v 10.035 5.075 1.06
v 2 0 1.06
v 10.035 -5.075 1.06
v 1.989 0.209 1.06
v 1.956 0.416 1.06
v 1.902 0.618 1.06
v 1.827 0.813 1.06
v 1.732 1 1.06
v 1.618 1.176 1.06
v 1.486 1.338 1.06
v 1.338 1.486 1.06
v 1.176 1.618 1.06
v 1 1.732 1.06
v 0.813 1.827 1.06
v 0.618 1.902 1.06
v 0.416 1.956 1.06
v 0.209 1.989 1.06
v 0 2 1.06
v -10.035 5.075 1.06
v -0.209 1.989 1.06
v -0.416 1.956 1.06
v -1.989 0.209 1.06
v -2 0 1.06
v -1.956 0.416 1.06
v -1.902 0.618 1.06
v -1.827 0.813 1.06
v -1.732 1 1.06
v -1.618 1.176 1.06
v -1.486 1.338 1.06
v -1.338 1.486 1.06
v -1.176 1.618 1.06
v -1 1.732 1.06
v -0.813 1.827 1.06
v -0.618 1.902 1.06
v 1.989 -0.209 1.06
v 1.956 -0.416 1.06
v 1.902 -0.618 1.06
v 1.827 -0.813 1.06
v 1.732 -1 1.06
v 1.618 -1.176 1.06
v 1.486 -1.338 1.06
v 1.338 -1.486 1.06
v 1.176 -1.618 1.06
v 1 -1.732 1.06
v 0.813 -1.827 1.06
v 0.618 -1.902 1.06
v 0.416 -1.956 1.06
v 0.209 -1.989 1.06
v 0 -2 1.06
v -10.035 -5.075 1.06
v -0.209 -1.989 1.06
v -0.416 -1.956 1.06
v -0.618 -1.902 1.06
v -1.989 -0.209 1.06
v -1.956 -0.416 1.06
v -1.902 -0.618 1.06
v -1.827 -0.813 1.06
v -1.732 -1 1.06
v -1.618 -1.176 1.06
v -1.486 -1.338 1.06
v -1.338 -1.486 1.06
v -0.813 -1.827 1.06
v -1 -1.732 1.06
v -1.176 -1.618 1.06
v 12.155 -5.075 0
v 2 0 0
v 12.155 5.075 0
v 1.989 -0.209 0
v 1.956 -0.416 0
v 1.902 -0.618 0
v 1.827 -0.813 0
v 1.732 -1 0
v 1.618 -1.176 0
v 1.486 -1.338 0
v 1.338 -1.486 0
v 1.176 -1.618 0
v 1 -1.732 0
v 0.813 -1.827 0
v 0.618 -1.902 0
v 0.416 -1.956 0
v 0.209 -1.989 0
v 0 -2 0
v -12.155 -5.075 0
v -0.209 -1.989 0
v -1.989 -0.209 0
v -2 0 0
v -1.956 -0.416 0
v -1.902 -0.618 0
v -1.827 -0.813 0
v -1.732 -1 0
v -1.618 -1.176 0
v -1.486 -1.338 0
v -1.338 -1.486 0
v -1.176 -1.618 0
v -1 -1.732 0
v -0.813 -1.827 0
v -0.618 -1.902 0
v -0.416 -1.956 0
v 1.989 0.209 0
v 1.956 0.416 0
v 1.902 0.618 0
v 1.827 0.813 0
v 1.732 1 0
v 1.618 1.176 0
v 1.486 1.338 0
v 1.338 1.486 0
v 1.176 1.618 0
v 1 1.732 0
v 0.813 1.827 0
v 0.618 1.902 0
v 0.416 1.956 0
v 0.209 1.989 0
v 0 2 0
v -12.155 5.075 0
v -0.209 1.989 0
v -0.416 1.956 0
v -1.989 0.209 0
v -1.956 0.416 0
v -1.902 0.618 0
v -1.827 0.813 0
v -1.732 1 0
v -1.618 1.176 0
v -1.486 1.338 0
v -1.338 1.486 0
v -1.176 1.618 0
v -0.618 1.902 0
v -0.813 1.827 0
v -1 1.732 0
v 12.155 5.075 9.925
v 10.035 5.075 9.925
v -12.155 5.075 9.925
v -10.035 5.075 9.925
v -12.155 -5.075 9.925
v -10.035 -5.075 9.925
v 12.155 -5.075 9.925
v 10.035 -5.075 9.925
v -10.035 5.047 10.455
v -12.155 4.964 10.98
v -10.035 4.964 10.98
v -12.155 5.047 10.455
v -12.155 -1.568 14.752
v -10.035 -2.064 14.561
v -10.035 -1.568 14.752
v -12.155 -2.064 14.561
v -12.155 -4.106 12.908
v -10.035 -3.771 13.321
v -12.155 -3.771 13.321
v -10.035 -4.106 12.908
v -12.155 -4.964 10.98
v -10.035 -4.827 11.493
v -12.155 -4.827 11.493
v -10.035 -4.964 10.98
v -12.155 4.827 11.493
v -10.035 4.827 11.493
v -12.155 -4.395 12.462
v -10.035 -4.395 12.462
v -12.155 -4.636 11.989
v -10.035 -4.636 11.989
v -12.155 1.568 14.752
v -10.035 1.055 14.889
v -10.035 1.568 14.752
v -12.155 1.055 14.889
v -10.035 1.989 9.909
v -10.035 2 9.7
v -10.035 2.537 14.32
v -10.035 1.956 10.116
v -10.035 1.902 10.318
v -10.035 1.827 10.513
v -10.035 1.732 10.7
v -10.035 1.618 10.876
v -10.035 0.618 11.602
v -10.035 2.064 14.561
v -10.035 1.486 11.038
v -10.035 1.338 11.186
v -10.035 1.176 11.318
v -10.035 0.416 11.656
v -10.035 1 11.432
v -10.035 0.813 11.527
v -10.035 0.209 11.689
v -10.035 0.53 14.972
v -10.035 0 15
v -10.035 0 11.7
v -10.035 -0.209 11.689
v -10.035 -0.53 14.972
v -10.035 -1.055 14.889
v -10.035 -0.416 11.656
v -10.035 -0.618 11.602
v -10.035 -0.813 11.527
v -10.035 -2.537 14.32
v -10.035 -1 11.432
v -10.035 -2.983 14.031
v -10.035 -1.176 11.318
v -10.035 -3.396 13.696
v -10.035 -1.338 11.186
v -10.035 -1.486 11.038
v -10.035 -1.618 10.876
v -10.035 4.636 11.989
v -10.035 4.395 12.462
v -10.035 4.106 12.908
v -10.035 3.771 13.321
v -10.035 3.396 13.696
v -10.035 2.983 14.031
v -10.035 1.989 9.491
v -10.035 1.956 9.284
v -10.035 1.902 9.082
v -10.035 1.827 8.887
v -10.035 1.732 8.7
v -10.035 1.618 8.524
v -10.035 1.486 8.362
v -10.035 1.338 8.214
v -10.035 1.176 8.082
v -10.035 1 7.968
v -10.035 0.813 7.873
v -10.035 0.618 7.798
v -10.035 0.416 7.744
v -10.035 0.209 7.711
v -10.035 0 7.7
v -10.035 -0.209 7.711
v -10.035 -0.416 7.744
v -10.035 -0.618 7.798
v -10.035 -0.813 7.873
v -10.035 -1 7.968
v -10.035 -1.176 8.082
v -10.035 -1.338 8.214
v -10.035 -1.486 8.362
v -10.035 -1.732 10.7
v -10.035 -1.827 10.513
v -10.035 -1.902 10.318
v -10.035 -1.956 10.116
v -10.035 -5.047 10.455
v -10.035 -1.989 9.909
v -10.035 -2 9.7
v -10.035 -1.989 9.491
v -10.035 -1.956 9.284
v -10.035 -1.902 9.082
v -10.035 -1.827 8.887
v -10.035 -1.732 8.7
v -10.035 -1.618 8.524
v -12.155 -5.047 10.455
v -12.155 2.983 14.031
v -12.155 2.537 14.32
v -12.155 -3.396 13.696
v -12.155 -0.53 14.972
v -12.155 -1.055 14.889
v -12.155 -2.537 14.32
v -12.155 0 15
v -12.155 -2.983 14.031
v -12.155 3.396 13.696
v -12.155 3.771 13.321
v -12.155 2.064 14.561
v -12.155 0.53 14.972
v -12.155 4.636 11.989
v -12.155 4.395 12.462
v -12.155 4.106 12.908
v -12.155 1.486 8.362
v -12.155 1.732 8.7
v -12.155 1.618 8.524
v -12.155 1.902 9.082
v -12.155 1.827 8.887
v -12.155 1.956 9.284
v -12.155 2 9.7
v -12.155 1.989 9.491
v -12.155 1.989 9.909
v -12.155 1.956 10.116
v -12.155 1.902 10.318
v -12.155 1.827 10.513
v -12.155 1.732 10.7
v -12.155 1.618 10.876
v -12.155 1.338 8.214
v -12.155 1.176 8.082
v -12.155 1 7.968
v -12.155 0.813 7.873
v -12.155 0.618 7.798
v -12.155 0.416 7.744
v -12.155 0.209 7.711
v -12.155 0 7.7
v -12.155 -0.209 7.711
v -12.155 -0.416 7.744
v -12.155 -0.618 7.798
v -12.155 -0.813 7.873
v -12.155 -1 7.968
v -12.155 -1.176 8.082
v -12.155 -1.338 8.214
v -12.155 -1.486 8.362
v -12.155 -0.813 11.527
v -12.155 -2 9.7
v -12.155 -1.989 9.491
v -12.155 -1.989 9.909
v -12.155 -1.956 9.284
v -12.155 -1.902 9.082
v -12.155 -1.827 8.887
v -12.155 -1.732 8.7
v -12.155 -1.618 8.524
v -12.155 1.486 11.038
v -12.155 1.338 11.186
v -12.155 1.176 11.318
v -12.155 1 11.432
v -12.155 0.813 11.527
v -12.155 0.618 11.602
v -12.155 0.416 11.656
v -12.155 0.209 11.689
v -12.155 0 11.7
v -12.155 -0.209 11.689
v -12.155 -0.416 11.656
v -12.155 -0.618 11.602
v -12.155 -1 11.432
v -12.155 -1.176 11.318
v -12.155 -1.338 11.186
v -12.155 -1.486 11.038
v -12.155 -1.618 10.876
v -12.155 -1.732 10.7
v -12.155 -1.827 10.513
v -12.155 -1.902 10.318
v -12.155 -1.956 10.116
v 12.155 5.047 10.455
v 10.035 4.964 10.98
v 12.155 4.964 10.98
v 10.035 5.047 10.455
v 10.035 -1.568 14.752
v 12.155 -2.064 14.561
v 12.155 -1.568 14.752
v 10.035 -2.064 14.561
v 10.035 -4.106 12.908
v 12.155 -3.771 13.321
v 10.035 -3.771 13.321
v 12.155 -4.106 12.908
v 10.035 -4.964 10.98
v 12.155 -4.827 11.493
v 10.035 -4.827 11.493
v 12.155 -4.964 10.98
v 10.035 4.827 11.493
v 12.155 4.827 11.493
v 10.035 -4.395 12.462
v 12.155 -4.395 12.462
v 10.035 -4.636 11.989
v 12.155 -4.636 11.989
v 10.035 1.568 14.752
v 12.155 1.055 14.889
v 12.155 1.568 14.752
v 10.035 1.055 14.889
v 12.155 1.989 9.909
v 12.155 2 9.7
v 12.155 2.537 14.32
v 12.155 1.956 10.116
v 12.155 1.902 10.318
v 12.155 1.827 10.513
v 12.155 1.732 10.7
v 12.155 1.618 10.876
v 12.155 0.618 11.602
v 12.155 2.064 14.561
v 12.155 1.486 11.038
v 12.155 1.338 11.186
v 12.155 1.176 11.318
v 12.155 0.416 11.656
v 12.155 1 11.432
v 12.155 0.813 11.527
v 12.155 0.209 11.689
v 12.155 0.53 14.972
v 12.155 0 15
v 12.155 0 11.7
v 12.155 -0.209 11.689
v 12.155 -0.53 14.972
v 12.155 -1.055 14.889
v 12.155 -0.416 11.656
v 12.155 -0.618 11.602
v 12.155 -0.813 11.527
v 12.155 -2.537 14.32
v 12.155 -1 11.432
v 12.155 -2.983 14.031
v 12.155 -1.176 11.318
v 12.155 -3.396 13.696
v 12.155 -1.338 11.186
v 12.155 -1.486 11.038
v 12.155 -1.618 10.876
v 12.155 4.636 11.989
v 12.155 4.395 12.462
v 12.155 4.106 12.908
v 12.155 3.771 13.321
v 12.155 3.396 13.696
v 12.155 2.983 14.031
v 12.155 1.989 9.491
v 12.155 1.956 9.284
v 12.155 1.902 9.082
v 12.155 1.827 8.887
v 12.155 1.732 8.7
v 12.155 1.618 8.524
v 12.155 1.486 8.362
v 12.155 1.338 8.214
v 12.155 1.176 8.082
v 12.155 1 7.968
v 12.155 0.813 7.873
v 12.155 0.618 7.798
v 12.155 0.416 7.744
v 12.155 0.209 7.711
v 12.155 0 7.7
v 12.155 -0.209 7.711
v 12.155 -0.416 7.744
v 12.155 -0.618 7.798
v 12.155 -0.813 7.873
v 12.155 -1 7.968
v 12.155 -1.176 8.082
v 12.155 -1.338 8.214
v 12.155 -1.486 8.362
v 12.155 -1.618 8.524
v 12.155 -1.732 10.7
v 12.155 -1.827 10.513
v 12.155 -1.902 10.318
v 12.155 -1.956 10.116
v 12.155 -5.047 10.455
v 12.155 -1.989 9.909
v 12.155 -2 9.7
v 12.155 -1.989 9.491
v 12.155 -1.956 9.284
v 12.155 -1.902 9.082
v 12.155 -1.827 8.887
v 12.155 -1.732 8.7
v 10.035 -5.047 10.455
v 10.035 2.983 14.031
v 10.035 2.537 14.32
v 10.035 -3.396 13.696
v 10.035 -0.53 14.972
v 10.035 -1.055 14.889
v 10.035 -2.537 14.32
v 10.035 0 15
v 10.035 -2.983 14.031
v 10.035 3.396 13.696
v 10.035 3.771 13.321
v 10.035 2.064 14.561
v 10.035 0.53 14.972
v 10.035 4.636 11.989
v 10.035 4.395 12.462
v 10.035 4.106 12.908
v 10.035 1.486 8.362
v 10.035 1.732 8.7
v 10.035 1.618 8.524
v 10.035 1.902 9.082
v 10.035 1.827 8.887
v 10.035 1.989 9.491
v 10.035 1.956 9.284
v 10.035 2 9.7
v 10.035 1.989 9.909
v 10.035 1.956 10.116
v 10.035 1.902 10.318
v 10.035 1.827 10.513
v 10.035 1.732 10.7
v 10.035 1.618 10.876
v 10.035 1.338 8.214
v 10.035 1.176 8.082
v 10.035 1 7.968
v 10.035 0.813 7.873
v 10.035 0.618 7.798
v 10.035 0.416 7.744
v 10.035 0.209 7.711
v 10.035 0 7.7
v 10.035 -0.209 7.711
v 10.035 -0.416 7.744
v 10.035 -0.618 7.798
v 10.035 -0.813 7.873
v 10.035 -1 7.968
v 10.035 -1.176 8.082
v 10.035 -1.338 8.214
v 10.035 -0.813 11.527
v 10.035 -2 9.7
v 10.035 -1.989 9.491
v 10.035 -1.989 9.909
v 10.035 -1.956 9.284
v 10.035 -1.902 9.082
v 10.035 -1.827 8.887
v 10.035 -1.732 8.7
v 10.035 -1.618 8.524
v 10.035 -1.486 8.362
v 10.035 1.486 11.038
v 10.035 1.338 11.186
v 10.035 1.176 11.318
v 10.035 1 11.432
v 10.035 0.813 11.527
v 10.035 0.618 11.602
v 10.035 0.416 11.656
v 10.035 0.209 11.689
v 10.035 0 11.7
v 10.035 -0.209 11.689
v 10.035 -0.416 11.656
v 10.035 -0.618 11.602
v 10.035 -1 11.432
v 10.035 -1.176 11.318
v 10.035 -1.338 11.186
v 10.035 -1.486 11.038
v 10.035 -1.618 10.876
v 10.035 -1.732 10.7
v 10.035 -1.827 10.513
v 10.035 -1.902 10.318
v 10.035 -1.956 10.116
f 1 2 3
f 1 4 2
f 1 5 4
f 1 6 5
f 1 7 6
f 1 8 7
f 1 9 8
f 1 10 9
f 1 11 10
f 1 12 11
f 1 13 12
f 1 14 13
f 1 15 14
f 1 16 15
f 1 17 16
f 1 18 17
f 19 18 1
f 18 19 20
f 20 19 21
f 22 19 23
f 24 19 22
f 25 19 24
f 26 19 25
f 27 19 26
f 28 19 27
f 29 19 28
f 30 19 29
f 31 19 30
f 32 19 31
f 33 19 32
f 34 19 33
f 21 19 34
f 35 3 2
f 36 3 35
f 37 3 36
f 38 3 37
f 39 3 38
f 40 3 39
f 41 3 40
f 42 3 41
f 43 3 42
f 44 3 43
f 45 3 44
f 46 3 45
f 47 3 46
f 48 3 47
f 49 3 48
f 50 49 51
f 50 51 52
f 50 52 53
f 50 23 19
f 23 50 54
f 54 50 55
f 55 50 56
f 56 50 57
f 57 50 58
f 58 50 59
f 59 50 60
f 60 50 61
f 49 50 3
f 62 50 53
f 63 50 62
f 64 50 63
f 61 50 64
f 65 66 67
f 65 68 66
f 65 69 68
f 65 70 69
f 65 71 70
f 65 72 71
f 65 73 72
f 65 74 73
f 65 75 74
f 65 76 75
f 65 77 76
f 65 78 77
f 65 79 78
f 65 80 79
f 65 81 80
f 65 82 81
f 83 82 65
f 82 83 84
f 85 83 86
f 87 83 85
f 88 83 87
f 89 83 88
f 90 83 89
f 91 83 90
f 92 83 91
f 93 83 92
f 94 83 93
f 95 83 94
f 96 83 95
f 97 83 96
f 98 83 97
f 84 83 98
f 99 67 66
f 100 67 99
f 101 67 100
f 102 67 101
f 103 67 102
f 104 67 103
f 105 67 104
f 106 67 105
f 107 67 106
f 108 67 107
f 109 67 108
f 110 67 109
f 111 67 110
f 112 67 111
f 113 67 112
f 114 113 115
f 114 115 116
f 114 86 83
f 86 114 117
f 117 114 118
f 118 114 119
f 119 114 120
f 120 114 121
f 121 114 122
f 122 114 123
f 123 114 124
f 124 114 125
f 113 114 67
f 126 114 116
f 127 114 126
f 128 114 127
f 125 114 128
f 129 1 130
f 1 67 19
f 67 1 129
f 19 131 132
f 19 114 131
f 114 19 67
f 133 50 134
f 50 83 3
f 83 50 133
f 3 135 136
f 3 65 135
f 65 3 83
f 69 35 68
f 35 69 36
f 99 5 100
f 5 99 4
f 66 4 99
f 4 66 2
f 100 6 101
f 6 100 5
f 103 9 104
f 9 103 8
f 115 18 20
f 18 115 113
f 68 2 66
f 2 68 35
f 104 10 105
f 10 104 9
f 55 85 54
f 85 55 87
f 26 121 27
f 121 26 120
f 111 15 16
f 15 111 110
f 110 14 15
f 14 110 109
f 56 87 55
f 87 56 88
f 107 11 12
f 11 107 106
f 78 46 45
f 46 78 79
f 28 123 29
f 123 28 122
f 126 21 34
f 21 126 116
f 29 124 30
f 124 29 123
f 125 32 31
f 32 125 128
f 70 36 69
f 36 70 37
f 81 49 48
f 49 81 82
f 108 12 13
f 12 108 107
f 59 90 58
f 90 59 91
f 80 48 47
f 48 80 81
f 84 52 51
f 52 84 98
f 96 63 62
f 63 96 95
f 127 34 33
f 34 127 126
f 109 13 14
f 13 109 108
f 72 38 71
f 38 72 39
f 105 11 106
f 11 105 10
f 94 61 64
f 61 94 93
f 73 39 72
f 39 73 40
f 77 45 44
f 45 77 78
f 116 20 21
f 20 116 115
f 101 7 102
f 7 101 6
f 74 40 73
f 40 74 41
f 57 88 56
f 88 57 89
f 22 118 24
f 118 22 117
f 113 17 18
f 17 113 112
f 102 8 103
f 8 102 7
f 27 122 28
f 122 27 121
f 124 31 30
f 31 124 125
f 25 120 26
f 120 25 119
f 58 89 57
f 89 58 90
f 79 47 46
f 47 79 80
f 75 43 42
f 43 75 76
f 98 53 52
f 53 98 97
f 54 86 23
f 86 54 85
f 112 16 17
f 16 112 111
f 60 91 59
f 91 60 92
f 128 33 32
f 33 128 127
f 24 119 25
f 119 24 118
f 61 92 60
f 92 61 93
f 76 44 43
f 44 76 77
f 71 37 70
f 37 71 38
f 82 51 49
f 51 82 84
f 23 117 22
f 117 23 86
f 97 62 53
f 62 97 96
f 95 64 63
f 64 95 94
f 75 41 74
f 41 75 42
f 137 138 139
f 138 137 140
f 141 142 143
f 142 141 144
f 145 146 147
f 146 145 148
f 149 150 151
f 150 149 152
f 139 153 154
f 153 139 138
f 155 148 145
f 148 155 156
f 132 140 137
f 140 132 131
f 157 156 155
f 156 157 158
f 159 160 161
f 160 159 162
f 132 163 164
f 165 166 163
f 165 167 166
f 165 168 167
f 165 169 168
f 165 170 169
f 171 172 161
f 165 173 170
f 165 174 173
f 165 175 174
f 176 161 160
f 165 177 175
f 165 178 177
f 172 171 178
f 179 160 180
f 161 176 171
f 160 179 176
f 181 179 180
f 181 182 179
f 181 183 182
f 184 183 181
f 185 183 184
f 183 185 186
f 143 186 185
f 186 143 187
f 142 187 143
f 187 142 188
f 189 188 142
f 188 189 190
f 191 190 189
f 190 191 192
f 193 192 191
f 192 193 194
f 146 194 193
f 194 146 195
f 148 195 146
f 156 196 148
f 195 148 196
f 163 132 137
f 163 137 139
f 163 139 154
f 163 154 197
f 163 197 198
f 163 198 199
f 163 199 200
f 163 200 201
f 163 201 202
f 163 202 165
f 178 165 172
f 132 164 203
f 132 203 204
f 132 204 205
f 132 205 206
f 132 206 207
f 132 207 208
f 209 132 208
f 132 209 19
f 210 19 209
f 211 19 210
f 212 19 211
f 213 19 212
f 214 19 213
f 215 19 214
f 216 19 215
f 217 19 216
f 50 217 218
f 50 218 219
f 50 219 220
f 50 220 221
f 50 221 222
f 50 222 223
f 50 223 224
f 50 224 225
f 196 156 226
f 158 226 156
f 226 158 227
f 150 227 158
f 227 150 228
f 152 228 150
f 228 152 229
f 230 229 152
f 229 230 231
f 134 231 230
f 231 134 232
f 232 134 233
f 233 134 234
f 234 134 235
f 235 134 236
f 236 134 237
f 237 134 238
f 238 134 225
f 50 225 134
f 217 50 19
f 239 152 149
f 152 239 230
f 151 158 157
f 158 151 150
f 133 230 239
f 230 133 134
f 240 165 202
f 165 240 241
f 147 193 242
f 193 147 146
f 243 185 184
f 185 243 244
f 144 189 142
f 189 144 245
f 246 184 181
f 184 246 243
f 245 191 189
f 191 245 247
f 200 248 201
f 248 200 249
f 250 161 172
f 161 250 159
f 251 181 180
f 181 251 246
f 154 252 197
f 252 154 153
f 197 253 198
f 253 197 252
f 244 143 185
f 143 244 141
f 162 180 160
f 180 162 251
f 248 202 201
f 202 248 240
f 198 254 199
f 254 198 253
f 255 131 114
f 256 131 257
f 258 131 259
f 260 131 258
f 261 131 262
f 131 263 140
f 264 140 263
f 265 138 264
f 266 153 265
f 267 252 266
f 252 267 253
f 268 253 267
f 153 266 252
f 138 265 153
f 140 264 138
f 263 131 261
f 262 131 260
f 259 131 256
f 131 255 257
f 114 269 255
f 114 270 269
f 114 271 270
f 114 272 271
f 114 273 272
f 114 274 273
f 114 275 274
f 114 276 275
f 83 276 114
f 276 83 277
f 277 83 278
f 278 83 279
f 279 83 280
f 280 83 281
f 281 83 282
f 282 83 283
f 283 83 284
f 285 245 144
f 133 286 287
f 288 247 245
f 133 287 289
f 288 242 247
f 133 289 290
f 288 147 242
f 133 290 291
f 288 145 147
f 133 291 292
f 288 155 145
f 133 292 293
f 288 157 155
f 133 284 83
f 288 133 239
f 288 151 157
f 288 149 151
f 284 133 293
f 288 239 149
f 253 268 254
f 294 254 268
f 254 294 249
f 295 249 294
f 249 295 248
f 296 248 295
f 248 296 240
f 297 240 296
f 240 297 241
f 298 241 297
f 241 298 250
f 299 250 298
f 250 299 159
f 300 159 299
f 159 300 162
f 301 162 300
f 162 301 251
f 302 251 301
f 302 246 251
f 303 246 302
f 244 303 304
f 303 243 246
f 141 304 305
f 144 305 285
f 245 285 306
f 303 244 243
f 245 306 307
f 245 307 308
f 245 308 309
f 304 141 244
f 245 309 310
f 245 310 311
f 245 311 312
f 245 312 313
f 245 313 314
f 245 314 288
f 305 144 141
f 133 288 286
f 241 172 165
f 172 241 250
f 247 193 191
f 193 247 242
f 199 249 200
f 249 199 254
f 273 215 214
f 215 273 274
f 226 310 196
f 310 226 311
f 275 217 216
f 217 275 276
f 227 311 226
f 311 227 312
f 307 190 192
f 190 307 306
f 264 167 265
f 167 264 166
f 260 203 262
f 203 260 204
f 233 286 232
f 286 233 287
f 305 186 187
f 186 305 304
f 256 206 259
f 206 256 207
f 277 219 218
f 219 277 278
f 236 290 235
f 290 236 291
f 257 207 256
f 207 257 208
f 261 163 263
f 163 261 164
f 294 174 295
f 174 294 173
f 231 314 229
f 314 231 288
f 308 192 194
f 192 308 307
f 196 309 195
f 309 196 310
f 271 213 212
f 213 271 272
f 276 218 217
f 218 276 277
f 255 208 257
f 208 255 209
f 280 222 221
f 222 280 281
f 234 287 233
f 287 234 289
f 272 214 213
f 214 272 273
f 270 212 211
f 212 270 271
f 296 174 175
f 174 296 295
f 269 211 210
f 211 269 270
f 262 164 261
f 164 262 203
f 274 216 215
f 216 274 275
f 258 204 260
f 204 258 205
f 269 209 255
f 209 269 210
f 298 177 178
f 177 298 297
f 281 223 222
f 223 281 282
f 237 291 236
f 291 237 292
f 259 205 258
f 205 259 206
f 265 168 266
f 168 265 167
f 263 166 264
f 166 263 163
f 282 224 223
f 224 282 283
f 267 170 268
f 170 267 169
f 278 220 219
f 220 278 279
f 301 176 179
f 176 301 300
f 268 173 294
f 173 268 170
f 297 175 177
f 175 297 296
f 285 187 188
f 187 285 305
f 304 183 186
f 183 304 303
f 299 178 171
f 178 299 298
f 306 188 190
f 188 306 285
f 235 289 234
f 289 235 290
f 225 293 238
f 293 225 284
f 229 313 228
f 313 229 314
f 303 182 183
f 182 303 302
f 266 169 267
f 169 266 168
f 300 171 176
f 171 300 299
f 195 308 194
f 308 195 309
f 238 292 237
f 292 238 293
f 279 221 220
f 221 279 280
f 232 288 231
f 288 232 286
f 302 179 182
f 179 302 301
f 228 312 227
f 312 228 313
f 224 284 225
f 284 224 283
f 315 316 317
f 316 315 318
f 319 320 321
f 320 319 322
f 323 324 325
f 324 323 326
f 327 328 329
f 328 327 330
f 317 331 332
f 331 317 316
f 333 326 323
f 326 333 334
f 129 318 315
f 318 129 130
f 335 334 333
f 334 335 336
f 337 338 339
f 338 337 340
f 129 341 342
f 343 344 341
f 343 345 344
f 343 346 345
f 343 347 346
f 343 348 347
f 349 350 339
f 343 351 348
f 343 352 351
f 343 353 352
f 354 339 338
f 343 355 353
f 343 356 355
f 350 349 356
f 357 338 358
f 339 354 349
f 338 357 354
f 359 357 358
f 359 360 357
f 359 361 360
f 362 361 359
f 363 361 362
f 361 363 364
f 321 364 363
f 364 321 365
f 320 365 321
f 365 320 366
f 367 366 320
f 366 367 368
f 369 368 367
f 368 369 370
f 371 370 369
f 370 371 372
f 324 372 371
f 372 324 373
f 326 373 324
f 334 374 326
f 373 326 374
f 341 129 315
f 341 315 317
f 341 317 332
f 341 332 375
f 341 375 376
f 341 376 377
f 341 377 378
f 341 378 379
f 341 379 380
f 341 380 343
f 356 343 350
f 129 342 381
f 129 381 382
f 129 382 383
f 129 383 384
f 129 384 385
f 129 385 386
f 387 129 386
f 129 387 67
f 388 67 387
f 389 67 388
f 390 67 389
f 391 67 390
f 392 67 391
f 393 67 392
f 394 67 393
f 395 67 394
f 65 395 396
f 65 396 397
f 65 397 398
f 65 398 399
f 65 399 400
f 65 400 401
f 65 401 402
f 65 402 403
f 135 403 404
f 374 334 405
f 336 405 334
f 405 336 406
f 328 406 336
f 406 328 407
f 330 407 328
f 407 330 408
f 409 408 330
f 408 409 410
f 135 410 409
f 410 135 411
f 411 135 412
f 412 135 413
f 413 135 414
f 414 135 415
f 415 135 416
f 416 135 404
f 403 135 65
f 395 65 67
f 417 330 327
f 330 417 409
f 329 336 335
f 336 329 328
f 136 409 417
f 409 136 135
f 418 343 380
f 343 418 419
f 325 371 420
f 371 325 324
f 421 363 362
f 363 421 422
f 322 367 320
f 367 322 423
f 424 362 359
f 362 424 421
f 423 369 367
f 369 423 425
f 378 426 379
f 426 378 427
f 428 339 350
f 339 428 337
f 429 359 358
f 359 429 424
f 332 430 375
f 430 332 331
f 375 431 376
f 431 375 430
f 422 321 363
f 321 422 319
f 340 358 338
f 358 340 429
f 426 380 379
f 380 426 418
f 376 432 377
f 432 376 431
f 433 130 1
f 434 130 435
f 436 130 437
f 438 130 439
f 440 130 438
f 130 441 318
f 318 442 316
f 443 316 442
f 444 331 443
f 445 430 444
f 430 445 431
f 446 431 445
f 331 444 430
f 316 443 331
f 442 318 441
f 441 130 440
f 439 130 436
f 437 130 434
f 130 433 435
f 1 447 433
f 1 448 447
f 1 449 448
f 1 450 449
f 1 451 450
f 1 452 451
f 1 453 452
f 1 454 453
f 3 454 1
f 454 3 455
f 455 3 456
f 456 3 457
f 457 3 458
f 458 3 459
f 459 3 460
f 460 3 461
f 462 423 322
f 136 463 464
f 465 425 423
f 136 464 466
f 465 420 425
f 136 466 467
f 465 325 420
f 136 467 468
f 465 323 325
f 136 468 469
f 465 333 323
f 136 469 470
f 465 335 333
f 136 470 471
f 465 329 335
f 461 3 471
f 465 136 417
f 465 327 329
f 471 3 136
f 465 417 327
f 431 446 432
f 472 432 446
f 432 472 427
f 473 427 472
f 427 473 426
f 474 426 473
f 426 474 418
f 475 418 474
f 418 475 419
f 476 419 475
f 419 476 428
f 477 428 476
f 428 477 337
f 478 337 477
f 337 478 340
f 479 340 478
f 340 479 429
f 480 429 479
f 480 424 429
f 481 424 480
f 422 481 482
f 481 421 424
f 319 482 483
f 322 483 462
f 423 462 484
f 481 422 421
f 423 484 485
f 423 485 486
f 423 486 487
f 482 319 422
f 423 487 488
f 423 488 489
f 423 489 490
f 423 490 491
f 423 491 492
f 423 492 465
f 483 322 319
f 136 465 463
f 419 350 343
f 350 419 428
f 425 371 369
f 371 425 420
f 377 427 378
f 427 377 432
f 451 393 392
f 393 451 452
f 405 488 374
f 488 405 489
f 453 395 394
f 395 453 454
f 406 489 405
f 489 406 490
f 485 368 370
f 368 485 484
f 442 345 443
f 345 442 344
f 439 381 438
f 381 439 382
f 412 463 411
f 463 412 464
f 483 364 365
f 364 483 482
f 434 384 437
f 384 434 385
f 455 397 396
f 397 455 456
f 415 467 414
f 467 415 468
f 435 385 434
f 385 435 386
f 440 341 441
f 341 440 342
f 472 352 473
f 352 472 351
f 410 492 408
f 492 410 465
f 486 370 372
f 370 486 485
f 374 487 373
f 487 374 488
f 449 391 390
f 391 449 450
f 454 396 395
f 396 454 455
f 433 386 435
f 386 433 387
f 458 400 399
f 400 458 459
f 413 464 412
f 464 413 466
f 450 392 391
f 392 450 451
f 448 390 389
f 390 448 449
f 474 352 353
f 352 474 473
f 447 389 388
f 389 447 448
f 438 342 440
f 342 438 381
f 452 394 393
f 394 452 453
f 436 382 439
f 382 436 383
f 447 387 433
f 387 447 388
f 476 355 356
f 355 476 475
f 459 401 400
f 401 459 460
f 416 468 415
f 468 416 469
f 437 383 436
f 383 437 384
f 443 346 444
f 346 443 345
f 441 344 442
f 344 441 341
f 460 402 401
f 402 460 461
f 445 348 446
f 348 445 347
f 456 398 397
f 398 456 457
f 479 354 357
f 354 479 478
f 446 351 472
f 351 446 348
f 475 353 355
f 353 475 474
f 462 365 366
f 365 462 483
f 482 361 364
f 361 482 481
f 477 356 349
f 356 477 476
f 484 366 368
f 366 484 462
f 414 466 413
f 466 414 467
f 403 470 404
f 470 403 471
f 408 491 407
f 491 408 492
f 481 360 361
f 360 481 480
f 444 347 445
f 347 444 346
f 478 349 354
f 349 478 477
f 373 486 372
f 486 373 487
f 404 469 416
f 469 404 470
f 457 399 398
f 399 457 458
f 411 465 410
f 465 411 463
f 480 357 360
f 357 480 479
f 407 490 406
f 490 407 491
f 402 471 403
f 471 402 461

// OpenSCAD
eps = 0.01;

module u_profile_black()
{
  d = 4;
  d2e = 3.3;
  w = 10.15;
  h = 1.06;
  wall_h = 15;

  // lower side
  l_size = [23.25, w, h];
  difference()
  {
    translate([-l_size[0]/2, -l_size[1]/2, 0])
      cube(l_size);
    translate([0, 0, -eps])
      cylinder(d=d, h=h+2*eps, $fn=60);
  }
  // walls
  for(dx=[-1,+1])
    translate([dx*(l_size[0]-h)/2, 0, 0])
      difference()
      {
        // wall
        hull()
        {
          translate([-2*h/2, -w/2, 0])
            cube([2*h, w, h]);
          translate([-2*h/2, 0, wall_h-w/2])
            rotate([0, 90, 0])
              cylinder(d=w, h=2*h, $fn=60);
        }
        // screw hole
        translate([-2*h/2-eps, 0, wall_h-d2e-d/2])
          rotate([0, 90, 0])
            cylinder(d=d, h=2*h+2*eps, $fn=60);
      }
}

u_profile_black();
